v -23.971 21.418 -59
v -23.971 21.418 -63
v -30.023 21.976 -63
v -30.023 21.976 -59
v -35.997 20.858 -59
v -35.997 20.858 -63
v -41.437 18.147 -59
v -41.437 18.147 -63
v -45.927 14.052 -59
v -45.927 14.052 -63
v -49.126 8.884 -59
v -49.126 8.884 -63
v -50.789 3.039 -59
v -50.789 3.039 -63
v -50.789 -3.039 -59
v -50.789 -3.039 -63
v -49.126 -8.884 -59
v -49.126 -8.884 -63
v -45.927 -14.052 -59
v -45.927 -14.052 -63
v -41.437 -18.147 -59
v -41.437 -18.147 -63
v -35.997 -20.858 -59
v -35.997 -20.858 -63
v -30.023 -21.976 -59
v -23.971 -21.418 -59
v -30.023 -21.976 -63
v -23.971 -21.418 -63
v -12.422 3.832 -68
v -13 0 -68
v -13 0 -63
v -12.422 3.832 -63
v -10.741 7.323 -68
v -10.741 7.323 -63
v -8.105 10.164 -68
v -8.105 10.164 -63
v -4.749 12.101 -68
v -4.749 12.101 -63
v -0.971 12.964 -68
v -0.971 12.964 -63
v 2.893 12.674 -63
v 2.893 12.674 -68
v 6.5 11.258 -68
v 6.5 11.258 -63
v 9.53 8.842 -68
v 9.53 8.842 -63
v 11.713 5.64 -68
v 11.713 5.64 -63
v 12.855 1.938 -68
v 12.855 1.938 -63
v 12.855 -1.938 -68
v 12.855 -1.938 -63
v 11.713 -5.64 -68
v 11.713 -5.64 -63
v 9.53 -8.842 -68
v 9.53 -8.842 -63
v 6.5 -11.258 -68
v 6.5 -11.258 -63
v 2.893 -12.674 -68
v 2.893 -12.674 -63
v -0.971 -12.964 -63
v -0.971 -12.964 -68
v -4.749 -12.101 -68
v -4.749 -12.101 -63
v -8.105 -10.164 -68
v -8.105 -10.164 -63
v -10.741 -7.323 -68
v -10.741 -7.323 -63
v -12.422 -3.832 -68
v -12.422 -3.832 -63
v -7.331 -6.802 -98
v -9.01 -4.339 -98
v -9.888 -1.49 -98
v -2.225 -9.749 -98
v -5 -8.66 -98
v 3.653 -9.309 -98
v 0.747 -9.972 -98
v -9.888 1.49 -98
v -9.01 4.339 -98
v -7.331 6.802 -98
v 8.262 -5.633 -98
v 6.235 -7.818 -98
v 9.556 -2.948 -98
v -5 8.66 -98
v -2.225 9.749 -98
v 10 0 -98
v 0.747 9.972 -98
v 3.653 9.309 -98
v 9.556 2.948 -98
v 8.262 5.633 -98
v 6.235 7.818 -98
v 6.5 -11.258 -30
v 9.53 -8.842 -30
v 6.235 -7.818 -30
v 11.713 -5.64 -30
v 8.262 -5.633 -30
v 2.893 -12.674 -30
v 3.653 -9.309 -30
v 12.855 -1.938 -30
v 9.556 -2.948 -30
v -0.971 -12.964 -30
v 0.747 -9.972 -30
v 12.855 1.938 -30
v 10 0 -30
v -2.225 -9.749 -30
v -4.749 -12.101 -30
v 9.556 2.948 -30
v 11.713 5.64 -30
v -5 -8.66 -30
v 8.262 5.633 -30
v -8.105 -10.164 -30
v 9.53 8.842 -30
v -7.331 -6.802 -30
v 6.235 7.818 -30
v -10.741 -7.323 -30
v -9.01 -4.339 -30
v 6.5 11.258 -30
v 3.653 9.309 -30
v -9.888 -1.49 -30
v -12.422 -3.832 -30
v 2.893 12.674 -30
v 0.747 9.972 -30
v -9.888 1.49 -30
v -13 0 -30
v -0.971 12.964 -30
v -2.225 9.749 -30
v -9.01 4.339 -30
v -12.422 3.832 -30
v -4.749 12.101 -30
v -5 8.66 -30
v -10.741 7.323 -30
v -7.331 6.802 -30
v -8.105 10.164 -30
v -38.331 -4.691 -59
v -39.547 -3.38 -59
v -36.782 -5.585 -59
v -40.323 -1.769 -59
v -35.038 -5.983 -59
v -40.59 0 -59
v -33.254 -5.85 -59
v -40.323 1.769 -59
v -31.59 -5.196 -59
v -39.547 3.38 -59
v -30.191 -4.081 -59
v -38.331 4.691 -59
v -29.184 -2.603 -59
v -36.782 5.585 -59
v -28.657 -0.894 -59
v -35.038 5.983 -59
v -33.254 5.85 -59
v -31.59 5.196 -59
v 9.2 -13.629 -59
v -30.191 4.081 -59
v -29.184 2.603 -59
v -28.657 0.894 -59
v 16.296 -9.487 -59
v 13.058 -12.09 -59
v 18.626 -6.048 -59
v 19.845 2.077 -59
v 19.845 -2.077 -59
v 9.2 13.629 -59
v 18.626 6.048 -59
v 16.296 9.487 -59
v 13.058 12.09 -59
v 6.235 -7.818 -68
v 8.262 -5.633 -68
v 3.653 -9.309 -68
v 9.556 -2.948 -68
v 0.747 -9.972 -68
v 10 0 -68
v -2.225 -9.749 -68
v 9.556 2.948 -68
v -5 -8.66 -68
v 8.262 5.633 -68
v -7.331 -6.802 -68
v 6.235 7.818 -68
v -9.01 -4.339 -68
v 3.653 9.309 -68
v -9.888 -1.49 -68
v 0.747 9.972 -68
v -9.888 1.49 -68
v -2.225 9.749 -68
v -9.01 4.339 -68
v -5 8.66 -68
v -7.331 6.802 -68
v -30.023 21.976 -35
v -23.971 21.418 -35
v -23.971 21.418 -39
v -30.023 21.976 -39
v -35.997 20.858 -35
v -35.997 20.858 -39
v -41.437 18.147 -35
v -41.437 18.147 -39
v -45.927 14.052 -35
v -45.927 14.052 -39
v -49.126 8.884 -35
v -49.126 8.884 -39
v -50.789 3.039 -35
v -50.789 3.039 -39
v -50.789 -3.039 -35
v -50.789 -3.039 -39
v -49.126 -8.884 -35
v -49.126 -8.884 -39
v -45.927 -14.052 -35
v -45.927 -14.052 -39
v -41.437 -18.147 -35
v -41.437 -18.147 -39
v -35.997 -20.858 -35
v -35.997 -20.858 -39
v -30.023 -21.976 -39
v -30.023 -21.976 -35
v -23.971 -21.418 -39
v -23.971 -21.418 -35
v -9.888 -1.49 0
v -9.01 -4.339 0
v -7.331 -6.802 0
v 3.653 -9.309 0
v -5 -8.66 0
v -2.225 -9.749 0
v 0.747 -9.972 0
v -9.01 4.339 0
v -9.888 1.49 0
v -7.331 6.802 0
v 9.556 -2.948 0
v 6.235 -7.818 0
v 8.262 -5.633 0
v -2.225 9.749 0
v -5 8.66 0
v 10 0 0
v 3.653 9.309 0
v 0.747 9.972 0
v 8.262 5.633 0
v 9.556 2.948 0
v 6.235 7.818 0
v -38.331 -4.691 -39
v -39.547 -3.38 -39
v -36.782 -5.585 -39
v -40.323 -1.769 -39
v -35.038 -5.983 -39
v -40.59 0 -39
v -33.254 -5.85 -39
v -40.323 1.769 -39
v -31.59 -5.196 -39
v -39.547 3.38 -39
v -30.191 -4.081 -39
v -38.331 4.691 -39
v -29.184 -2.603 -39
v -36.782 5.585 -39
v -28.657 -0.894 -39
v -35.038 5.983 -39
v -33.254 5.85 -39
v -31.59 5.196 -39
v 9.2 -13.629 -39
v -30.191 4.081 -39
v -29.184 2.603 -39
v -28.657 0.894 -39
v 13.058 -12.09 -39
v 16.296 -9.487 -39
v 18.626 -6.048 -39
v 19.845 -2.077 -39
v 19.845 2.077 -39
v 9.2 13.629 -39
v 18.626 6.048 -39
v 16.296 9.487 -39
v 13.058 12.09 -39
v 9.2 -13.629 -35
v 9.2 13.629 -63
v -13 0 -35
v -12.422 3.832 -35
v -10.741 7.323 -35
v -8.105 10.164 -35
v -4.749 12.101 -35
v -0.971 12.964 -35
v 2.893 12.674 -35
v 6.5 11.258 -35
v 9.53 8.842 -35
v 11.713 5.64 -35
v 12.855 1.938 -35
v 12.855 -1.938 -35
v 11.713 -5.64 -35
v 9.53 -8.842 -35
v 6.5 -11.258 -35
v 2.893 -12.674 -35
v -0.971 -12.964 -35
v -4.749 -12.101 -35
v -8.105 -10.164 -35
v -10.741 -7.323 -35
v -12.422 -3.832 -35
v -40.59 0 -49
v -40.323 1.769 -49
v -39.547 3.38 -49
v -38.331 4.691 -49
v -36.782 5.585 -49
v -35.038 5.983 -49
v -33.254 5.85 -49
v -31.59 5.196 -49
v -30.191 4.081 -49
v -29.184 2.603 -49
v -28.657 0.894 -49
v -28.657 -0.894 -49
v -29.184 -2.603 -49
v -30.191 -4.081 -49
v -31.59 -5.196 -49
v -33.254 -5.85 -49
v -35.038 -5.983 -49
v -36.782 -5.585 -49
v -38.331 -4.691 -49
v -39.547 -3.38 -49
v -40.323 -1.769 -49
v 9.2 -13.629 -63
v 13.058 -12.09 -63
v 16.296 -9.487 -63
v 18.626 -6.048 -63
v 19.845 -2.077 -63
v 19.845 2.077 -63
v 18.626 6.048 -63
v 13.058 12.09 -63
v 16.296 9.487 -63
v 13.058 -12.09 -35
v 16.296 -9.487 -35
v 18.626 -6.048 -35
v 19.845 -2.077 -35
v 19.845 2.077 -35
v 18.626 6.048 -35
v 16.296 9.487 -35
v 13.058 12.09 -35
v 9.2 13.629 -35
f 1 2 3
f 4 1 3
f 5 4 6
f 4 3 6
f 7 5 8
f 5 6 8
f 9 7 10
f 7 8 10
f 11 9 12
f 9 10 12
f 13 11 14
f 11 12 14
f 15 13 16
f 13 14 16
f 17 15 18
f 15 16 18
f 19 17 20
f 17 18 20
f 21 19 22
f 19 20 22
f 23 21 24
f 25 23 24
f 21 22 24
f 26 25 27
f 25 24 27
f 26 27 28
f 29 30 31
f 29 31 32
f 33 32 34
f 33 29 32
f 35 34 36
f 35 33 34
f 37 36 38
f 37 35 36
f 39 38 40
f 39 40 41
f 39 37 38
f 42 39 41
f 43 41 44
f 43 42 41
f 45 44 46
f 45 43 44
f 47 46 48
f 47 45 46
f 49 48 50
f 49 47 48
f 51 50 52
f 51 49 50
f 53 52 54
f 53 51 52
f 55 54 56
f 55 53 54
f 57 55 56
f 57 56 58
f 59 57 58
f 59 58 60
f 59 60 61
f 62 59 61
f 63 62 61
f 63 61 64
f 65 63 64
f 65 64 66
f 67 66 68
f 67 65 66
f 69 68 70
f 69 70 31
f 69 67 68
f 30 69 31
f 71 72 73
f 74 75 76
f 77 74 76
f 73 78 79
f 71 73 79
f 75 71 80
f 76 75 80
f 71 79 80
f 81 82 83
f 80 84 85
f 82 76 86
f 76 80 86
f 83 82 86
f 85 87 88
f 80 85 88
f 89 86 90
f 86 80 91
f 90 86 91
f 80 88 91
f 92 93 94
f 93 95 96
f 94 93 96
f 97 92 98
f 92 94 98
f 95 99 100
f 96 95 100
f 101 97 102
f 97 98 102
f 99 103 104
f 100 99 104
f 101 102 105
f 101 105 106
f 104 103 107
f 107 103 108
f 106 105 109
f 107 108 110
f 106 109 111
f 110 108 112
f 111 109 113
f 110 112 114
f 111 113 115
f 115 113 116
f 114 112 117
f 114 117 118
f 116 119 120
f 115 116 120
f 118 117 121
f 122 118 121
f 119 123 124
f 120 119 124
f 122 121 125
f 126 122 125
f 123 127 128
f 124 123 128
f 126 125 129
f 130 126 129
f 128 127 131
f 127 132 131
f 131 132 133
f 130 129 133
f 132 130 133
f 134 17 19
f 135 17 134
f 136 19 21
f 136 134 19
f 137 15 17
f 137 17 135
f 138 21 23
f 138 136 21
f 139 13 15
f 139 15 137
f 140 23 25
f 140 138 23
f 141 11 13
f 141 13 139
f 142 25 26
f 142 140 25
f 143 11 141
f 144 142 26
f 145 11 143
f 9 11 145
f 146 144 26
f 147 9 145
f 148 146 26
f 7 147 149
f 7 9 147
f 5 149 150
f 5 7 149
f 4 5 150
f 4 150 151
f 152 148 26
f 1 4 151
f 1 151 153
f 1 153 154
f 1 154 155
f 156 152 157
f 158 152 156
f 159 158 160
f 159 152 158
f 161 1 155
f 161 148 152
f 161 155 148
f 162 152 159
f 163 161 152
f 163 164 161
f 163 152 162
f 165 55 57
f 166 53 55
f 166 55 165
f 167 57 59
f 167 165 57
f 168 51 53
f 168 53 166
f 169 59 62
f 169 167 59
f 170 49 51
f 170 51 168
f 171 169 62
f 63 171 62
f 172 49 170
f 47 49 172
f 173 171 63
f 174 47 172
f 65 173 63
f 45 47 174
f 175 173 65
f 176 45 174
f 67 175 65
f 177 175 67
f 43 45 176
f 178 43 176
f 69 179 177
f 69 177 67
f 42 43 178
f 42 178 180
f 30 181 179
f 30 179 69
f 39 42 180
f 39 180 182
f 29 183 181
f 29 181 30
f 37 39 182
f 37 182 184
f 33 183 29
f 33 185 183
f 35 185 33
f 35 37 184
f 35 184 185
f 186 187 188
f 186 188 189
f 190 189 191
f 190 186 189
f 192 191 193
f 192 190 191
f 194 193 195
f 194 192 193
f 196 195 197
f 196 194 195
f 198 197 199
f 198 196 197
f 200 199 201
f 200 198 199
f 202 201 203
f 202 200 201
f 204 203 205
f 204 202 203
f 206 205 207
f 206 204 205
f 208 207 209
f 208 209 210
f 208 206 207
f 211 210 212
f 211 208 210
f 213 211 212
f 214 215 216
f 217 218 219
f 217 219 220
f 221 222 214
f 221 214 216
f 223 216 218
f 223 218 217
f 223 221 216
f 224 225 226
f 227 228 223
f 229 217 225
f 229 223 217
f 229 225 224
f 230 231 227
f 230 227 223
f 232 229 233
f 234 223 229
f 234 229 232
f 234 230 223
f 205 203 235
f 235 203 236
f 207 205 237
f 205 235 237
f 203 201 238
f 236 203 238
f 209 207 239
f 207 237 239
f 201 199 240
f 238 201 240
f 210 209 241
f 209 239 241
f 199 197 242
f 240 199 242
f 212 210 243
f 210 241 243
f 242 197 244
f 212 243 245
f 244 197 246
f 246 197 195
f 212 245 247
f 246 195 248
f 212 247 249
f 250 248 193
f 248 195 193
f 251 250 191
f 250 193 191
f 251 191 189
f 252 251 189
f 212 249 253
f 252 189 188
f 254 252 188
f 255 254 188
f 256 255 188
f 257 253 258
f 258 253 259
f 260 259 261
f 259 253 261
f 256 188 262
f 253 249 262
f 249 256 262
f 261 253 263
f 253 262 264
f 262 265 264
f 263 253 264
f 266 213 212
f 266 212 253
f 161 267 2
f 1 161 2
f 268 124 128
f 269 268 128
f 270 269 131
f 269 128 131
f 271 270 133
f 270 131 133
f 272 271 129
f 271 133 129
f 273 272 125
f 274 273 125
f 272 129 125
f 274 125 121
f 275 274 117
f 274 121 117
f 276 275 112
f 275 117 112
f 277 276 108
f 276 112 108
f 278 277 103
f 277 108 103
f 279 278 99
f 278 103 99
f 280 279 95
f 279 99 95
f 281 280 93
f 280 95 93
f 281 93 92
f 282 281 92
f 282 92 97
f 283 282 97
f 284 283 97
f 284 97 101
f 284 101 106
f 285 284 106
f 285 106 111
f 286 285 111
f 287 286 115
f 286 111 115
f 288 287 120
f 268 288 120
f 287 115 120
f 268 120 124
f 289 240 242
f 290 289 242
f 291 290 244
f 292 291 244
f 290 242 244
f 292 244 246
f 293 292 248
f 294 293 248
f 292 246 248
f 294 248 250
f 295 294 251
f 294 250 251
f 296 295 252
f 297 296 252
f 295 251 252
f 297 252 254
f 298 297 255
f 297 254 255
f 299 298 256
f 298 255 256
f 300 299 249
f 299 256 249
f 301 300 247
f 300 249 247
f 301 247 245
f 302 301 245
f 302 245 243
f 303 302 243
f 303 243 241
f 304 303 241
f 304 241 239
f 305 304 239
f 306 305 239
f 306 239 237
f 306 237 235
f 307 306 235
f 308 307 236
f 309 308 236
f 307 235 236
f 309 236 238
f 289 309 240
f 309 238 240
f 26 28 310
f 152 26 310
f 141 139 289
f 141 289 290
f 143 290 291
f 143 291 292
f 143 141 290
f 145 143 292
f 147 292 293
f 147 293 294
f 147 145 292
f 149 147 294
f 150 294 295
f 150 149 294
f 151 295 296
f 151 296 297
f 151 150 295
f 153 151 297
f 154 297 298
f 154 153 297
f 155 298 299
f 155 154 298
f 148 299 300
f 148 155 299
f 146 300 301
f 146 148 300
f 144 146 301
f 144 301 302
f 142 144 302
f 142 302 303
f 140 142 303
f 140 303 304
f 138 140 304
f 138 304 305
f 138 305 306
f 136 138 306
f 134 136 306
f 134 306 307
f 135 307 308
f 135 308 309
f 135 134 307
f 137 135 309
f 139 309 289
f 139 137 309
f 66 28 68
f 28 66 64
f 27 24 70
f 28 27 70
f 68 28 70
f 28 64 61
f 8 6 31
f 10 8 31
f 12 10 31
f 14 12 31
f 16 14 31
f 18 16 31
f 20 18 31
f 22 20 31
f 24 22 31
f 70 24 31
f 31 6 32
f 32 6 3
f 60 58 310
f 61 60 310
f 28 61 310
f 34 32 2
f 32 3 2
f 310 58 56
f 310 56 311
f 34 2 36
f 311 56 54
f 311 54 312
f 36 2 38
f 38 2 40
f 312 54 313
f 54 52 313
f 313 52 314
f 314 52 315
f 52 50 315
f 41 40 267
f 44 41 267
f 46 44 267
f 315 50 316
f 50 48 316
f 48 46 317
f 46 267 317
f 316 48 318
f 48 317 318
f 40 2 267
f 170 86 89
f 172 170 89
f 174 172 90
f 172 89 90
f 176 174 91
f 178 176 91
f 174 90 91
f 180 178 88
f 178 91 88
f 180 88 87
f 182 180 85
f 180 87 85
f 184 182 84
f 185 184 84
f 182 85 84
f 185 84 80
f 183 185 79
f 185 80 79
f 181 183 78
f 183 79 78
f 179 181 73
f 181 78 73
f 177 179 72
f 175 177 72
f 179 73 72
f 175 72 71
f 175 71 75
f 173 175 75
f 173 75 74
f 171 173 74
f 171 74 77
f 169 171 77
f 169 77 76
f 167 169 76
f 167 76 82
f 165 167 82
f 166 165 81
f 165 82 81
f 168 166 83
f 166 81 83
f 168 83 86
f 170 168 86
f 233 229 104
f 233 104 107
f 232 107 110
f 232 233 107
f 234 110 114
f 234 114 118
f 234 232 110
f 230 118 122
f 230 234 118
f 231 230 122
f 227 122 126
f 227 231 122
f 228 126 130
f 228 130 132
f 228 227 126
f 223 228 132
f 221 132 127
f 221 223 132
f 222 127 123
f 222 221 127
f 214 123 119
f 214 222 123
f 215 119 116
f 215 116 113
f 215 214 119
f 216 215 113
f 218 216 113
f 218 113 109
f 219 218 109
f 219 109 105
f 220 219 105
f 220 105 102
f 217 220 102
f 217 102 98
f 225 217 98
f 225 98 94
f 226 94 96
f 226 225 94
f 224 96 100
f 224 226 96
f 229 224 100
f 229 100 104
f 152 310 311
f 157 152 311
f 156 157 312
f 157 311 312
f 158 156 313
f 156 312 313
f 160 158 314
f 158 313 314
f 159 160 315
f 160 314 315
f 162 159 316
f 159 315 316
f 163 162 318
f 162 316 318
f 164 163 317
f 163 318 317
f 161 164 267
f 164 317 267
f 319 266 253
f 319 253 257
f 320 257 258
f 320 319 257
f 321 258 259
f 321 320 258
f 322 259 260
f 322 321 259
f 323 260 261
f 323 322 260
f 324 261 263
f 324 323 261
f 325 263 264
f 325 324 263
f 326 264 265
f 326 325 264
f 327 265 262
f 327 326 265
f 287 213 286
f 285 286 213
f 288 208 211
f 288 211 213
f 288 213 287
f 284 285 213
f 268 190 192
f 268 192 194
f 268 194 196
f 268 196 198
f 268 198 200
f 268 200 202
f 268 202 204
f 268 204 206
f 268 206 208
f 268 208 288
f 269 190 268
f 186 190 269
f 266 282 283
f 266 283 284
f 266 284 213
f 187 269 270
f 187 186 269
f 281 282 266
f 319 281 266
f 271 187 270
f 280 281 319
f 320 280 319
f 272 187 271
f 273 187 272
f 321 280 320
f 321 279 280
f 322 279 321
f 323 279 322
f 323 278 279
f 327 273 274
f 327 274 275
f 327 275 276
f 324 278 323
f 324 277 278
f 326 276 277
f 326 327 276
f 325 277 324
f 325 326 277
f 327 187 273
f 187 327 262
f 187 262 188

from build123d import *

# Parameters (mm, degrees)
SKETCH_1_R      = 10
EXTRUDE_1_DEPTH = 30
SKETCH_2_R      = 13
EXTRUDE_2_DEPTH = 5
EXTRUDE_3_DEPTH = 4
SKETCH_5_R      = 6
EXTRUDE_4_DEPTH = 10


with BuildPart() as part:
    # 草图1 → 拉伸1 (new body)
    with BuildSketch(Plane.XY):
        Circle(SKETCH_1_R)
    extrude_1 = extrude(amount=-EXTRUDE_1_DEPTH)

    # 草图2 → 拉伸2 (add)
    with BuildSketch(Plane(origin=(0, 0, -30), x_dir=(-1, 0, 0), z_dir=(0, 0, -1))):
        Circle(SKETCH_2_R)
    extrude_2 = extrude(amount=EXTRUDE_2_DEPTH)

    # 草图3 → 拉伸3 (add)
    with BuildSketch(Plane(origin=(0, 0, -35), x_dir=(-1, 0, 0), z_dir=(0, 0, -1))):
        with BuildLine():
            Line((-9.2, 13.62938003), (23.971428571, 21.41759719))
            ThreePointArc((23.971428571, 21.41759719), (51, 0), (23.971428571, -21.41759719))
            Line((23.971428571, -21.41759719), (-9.2, -13.62938003))
            ThreePointArc((-9.2, -13.62938003), (-20, 0), (-9.2, 13.62938003))
        make_face()
    extrude_3 = extrude(amount=EXTRUDE_3_DEPTH)

    # 草图5 → 拉伸4 (add)
    with BuildSketch(Plane(origin=(0, 0, -39), x_dir=(-1, 0, 0), z_dir=(0, 0, -1))):
        with Locations((34.589570742, 0)):
            Circle(SKETCH_5_R)
    extrude_4 = extrude(amount=EXTRUDE_4_DEPTH)

    # 镜向2: 拉伸1, 拉伸2, 拉伸3, 拉伸4 across plane
    add(extrude_1.mirror(Plane(origin=(-34.589570742, 0, -49), x_dir=(1, 0, 0), z_dir=(0, 0, -1))))
    add(extrude_2.mirror(Plane(origin=(-34.589570742, 0, -49), x_dir=(1, 0, 0), z_dir=(0, 0, -1))))
    add(extrude_3.mirror(Plane(origin=(-34.589570742, 0, -49), x_dir=(1, 0, 0), z_dir=(0, 0, -1))))
    add(extrude_4.mirror(Plane(origin=(-34.589570742, 0, -49), x_dir=(1, 0, 0), z_dir=(0, 0, -1))))


solid = part.part
